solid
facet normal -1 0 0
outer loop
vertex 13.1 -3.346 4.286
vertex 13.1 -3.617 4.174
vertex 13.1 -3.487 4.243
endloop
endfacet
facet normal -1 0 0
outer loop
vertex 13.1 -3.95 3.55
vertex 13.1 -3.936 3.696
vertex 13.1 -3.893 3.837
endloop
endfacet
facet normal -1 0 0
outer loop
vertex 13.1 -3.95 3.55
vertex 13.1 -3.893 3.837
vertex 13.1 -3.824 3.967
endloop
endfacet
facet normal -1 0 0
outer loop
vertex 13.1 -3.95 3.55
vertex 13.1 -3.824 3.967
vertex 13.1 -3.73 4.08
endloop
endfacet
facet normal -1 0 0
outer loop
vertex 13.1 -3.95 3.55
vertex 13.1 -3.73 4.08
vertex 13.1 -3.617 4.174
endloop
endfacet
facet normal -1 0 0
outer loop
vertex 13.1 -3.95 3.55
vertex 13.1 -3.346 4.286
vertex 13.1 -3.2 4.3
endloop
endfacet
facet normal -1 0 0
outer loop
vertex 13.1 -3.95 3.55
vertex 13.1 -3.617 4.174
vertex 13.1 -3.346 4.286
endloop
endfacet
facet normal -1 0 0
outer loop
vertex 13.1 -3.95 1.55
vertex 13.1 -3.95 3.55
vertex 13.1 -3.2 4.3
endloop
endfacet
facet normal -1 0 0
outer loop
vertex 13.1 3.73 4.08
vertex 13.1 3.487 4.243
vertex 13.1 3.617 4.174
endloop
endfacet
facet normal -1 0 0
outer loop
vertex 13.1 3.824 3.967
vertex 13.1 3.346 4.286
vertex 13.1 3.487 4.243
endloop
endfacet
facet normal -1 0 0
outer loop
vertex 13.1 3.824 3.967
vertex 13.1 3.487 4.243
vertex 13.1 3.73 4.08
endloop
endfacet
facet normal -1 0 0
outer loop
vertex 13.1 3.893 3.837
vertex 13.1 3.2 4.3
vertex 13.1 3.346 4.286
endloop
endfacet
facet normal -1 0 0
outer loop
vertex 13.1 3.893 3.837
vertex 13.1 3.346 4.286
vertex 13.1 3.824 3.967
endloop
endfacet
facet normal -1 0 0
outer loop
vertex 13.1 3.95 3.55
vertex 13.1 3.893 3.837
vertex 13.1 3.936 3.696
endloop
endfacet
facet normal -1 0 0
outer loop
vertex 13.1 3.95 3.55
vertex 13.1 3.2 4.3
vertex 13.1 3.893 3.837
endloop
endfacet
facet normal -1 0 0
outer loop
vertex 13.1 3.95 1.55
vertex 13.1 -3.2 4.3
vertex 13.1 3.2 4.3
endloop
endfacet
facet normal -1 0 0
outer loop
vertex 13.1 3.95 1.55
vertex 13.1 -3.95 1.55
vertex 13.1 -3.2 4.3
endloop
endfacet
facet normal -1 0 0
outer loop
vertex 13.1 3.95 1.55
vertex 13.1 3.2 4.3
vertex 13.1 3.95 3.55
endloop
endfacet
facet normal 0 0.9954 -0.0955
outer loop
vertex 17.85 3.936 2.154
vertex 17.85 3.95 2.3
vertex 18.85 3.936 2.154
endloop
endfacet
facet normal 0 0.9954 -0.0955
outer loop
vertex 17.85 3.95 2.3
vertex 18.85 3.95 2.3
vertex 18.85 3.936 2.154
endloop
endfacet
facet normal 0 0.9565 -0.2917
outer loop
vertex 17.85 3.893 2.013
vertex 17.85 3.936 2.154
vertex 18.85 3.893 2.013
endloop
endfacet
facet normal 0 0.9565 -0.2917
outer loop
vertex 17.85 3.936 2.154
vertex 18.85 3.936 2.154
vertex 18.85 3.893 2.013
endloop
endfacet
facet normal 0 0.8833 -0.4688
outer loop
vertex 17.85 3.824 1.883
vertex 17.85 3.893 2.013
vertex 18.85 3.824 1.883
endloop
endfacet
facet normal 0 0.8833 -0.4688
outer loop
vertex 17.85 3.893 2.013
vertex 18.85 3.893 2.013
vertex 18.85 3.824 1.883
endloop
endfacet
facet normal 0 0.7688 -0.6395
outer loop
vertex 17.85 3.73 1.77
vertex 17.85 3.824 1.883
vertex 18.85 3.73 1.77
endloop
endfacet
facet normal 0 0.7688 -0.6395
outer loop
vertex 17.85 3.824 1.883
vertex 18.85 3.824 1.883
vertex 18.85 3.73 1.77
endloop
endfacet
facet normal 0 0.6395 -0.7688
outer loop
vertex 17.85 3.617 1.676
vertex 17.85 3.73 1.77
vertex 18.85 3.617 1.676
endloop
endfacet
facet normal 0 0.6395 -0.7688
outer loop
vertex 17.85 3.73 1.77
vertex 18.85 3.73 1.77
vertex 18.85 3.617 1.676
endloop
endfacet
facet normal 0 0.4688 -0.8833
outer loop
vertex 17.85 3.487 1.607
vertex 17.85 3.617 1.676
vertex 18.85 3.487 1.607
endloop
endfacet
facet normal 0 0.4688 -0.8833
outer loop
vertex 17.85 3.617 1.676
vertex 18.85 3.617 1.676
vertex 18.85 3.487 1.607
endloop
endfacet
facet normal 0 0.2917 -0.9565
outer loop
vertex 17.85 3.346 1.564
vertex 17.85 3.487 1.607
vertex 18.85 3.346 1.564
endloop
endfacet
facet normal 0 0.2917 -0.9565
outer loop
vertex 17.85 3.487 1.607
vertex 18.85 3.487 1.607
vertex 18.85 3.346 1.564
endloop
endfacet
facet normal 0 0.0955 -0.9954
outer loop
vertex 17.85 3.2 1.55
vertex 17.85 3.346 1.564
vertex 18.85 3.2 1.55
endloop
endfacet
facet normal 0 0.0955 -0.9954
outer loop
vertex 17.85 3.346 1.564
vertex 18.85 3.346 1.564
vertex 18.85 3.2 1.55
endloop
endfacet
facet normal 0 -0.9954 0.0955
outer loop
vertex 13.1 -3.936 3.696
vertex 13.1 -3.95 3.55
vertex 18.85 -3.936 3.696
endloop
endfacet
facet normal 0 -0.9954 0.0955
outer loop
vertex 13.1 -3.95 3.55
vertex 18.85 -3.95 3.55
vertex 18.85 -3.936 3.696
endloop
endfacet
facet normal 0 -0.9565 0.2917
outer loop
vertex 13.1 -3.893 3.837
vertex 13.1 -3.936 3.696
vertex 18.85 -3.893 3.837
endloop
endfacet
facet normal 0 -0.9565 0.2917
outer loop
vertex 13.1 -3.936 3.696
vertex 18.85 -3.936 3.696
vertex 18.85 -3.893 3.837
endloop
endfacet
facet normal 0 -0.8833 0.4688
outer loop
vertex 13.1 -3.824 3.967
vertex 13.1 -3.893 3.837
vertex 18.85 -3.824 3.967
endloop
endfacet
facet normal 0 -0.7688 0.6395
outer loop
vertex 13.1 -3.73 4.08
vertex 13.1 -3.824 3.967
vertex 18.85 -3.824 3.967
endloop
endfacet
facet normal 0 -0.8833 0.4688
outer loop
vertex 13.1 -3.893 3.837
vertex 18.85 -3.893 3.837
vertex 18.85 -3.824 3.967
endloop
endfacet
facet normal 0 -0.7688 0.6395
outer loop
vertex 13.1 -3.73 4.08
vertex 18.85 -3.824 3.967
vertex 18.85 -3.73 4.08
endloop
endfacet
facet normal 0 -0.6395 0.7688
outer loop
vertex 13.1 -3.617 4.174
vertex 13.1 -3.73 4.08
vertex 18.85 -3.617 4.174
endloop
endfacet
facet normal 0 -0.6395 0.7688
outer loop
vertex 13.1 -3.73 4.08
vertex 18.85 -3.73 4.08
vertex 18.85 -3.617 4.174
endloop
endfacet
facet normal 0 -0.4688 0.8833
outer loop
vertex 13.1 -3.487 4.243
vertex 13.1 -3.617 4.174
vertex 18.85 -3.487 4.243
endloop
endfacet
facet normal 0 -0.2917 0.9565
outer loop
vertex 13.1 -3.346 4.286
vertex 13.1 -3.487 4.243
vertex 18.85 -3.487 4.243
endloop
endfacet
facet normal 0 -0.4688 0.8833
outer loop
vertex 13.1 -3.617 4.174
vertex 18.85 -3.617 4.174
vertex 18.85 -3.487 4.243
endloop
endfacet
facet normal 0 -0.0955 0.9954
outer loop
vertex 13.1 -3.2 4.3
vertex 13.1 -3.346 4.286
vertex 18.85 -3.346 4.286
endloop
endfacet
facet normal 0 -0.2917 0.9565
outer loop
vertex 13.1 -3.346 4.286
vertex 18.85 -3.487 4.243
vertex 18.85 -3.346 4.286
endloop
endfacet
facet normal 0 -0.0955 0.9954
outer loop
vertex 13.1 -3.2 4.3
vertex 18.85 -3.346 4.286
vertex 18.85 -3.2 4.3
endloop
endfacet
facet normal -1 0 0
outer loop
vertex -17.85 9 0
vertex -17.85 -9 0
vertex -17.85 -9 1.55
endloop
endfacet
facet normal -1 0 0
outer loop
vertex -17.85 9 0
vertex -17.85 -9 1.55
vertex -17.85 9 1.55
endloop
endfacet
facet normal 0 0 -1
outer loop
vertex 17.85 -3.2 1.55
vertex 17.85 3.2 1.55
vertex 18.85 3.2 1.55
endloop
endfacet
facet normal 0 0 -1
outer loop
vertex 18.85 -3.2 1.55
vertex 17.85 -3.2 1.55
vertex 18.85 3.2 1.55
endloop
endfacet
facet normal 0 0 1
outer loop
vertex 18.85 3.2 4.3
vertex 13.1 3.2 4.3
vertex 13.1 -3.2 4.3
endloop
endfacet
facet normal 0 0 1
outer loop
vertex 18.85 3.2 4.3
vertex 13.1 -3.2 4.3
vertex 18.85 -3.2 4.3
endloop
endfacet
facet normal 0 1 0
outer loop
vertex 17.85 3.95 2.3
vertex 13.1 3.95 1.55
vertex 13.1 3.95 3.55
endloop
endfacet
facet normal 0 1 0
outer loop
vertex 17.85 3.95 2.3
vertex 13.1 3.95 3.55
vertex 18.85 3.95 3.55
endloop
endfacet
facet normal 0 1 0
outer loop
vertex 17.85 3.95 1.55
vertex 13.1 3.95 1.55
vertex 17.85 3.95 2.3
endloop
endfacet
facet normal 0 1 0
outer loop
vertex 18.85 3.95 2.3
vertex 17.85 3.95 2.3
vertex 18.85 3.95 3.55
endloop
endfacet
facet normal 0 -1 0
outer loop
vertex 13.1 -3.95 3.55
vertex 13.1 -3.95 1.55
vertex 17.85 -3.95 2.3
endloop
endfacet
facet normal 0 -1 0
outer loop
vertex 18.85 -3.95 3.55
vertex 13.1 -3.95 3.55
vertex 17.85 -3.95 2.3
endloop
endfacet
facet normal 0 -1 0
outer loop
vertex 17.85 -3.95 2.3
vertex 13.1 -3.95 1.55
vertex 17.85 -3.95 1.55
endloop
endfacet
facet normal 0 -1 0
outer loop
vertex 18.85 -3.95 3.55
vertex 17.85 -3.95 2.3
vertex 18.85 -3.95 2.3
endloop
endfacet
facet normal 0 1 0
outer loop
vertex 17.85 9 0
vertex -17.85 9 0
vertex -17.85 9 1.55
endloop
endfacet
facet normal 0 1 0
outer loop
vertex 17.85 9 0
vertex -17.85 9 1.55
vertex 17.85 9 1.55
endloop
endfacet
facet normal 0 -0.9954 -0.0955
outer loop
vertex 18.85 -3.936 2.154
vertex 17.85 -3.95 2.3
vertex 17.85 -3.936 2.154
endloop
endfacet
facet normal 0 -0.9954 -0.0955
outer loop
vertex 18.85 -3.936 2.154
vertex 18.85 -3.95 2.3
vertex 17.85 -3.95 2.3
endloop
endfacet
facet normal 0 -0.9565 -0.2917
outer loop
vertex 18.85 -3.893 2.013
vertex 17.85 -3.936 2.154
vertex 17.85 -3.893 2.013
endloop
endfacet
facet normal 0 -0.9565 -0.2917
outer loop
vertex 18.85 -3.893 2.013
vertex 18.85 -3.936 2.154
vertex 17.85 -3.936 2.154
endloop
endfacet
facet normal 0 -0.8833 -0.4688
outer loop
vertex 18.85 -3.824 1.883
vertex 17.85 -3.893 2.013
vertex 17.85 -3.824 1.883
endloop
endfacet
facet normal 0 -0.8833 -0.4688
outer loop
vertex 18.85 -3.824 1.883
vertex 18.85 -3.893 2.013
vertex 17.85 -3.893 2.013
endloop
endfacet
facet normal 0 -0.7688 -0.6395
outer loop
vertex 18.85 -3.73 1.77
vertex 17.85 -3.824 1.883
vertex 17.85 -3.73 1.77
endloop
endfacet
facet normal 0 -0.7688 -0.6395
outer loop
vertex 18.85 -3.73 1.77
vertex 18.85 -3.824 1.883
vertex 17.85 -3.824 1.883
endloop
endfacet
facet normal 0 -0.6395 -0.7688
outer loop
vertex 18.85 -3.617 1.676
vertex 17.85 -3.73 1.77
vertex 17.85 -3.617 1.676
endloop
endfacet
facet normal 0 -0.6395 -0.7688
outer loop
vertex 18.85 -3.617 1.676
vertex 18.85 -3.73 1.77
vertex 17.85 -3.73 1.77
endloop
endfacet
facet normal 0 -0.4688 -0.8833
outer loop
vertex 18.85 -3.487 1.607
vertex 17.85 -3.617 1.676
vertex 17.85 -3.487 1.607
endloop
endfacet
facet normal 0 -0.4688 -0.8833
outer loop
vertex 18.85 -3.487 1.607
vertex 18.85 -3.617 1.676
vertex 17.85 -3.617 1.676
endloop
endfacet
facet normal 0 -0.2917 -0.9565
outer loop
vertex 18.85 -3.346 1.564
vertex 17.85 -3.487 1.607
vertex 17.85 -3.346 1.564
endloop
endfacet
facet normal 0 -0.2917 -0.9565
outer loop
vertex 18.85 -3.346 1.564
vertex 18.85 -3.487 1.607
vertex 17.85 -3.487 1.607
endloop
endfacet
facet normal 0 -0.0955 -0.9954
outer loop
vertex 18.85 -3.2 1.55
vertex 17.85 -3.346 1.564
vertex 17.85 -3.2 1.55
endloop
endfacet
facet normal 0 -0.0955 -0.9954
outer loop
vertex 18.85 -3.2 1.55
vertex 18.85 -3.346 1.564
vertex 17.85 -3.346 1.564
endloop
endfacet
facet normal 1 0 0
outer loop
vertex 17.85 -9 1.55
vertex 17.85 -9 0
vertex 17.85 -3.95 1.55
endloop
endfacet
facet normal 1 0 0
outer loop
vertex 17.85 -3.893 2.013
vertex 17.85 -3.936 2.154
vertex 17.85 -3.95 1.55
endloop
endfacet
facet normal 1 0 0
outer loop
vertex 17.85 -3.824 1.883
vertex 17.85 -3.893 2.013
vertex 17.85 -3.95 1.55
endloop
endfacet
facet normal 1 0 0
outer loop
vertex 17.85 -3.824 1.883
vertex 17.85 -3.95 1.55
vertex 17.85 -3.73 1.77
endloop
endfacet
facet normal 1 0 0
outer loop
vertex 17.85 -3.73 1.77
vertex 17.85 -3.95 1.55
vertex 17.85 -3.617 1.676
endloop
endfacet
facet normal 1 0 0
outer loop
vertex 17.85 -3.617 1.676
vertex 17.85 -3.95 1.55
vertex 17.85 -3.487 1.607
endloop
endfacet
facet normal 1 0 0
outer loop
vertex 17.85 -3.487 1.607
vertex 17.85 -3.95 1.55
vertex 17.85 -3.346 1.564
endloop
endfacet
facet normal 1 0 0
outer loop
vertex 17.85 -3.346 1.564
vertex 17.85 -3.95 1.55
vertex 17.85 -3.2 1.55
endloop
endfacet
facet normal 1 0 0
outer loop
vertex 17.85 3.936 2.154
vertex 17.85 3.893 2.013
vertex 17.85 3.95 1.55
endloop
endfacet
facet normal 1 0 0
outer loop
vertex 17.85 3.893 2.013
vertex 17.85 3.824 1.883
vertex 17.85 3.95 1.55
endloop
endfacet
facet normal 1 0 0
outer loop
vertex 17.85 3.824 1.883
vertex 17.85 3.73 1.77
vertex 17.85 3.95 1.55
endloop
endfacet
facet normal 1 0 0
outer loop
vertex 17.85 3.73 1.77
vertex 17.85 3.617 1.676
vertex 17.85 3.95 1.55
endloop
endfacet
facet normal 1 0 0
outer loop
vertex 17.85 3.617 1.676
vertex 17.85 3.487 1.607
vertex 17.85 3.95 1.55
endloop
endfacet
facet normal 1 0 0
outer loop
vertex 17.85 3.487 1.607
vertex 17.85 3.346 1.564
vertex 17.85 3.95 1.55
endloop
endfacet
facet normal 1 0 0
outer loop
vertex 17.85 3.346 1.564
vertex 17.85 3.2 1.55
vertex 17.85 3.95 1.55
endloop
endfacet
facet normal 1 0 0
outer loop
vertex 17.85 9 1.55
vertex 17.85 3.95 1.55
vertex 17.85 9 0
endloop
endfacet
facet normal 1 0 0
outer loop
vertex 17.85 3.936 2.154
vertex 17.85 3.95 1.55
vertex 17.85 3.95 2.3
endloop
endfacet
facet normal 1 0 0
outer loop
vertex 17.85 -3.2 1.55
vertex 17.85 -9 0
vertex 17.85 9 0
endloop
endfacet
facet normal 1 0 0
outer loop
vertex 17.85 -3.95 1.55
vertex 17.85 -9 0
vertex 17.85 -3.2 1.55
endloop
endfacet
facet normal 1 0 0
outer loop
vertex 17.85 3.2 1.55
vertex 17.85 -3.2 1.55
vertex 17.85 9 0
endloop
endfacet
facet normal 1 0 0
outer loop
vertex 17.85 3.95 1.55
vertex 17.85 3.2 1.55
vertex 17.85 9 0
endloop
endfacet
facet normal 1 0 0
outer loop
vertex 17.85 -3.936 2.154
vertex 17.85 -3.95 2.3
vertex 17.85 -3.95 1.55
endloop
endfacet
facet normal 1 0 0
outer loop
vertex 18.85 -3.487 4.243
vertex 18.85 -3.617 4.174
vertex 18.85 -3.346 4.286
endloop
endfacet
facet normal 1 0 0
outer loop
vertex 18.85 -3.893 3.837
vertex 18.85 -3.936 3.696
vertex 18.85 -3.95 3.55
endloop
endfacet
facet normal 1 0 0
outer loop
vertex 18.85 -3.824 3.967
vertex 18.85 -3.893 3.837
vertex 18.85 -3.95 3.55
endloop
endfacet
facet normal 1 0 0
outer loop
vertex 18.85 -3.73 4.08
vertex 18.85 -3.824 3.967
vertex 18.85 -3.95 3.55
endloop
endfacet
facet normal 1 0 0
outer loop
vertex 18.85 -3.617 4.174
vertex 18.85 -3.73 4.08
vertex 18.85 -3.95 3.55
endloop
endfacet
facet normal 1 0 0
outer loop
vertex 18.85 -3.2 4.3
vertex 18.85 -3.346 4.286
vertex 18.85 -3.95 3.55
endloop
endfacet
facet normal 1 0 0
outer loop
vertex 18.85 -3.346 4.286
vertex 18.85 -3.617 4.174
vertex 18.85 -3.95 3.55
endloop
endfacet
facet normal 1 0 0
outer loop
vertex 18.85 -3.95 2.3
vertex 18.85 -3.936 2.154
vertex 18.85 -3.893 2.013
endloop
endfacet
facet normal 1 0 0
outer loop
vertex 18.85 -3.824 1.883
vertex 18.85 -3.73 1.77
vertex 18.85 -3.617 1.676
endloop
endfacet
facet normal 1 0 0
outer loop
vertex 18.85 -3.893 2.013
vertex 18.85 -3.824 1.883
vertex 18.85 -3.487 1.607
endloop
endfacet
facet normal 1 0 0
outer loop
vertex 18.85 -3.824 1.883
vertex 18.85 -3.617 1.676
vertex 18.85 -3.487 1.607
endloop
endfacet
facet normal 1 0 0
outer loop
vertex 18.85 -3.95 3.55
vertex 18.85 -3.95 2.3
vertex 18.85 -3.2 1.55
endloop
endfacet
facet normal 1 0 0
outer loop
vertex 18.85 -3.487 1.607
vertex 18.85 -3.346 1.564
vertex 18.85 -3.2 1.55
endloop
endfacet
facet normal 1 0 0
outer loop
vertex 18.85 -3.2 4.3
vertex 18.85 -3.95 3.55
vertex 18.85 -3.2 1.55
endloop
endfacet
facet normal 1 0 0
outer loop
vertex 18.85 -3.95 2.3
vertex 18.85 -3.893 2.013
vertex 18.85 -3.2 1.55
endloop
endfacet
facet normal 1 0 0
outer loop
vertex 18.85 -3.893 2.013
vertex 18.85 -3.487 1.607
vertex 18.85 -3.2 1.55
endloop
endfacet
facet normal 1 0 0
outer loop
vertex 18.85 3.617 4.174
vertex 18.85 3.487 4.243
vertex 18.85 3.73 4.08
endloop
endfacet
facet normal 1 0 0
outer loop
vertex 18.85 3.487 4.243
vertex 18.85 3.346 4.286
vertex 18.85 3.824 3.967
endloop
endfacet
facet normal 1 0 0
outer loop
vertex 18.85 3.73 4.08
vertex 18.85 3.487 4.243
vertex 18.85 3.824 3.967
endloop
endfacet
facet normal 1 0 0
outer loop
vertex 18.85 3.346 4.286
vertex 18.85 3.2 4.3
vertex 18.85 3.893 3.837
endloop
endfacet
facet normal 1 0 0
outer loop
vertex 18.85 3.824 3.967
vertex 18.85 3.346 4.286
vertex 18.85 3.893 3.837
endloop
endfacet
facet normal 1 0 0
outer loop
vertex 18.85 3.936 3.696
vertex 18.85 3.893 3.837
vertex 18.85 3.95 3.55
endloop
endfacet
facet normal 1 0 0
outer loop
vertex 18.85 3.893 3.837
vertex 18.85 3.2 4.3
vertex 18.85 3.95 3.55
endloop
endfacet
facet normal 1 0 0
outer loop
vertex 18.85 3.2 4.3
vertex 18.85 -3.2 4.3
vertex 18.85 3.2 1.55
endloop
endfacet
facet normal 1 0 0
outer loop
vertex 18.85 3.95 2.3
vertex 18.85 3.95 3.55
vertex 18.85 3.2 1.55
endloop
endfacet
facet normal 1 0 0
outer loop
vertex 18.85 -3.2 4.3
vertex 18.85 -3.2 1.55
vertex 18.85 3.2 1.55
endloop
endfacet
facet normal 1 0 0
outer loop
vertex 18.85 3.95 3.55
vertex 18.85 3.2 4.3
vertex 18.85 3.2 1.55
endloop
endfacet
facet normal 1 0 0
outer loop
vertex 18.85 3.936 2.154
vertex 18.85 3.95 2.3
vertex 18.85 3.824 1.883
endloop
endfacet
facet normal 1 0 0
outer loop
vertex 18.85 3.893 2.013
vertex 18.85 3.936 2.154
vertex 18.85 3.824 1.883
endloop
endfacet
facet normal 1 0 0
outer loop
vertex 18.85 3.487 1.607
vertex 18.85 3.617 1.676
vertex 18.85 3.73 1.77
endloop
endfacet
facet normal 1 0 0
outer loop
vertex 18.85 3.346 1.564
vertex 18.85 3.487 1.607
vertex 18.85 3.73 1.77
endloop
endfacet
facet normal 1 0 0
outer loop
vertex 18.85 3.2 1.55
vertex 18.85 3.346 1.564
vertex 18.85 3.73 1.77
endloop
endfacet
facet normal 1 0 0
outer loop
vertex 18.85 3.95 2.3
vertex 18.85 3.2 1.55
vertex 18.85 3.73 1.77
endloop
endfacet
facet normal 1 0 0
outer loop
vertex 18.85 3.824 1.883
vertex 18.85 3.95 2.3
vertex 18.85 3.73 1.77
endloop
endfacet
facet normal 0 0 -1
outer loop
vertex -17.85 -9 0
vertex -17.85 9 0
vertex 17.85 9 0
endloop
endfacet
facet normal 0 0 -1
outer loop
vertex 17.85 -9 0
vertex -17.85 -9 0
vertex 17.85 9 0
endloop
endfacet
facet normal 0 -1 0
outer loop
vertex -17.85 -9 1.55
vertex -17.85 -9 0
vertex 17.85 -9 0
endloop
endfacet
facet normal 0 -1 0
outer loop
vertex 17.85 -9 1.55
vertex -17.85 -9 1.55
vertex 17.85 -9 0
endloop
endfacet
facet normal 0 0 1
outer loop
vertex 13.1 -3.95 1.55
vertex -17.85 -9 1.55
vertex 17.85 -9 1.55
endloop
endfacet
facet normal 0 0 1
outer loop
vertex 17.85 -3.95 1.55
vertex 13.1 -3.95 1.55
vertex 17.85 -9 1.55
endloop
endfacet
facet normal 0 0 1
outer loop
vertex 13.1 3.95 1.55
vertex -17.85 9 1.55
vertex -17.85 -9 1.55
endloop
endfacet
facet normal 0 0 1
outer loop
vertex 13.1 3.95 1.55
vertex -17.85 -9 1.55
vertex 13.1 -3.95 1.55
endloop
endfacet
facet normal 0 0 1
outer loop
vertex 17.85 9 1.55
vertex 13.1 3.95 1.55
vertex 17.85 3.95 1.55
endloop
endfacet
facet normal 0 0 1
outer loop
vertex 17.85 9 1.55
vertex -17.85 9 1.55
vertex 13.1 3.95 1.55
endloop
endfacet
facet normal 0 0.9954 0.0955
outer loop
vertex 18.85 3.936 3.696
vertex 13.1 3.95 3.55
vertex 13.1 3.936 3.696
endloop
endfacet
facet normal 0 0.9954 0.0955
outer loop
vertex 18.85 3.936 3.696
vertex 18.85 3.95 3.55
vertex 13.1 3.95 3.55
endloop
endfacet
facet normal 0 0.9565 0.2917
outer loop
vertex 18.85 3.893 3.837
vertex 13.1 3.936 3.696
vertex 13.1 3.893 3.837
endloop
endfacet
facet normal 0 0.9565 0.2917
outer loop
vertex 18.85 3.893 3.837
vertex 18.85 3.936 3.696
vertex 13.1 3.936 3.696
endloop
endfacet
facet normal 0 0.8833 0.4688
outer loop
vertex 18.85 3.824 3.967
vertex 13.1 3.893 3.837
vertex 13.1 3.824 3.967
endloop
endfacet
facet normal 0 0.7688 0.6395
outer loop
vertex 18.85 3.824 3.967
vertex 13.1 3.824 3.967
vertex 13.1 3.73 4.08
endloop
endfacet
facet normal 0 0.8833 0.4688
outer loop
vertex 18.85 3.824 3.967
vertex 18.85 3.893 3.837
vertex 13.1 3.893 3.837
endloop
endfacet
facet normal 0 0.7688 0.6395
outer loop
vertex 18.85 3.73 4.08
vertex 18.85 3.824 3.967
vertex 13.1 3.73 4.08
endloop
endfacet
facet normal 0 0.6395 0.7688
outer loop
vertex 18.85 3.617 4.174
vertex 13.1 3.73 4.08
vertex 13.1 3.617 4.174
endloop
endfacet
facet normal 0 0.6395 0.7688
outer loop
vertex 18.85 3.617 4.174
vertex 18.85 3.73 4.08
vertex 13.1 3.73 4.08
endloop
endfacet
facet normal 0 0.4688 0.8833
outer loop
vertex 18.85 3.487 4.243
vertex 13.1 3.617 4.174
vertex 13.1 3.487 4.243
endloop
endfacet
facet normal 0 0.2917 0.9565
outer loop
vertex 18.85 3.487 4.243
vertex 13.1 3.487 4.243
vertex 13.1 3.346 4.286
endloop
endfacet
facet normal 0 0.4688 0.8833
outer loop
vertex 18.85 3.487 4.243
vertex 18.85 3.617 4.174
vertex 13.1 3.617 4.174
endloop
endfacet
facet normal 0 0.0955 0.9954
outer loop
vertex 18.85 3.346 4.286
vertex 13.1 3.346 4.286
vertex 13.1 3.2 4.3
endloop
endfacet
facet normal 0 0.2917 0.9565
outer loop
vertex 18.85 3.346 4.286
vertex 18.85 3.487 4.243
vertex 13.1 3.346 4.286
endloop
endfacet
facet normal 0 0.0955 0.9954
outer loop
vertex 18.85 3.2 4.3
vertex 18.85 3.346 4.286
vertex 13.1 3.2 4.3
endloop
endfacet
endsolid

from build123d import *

# Parameters (mm, degrees)
F0_W     = 35.7
F0_H     = 18
F1_DEPTH = 1.55
F2_W     = 5.75
F2_H     = 7.9
F3_DEPTH = 2.75
F4_R     = 0.75


with BuildPart() as f1:
    # F0 (on Top) → F1 (new body)
    with BuildSketch(Plane.XY):
        Rectangle(F0_W, F0_H)
    extrude(amount=F1_DEPTH)

    # F2 (on face) → F3 (join)
    with BuildSketch(Plane.XY.offset(1.55)):
        with Locations((15.975, 0)):
            Rectangle(F2_W, F2_H)
    extrude(amount=F3_DEPTH)

    # F4
    f4_edges = [f1.edges().sort_by_distance(p)[0] for p in [
        (15.975, 3.95, 4.3),
        (15.975, -3.95, 4.3),
        (18.35, 3.95, 1.55),
        (18.35, -3.95, 1.55),
    ]]
    fillet(f4_edges, radius=F4_R)


solid = f1.part
